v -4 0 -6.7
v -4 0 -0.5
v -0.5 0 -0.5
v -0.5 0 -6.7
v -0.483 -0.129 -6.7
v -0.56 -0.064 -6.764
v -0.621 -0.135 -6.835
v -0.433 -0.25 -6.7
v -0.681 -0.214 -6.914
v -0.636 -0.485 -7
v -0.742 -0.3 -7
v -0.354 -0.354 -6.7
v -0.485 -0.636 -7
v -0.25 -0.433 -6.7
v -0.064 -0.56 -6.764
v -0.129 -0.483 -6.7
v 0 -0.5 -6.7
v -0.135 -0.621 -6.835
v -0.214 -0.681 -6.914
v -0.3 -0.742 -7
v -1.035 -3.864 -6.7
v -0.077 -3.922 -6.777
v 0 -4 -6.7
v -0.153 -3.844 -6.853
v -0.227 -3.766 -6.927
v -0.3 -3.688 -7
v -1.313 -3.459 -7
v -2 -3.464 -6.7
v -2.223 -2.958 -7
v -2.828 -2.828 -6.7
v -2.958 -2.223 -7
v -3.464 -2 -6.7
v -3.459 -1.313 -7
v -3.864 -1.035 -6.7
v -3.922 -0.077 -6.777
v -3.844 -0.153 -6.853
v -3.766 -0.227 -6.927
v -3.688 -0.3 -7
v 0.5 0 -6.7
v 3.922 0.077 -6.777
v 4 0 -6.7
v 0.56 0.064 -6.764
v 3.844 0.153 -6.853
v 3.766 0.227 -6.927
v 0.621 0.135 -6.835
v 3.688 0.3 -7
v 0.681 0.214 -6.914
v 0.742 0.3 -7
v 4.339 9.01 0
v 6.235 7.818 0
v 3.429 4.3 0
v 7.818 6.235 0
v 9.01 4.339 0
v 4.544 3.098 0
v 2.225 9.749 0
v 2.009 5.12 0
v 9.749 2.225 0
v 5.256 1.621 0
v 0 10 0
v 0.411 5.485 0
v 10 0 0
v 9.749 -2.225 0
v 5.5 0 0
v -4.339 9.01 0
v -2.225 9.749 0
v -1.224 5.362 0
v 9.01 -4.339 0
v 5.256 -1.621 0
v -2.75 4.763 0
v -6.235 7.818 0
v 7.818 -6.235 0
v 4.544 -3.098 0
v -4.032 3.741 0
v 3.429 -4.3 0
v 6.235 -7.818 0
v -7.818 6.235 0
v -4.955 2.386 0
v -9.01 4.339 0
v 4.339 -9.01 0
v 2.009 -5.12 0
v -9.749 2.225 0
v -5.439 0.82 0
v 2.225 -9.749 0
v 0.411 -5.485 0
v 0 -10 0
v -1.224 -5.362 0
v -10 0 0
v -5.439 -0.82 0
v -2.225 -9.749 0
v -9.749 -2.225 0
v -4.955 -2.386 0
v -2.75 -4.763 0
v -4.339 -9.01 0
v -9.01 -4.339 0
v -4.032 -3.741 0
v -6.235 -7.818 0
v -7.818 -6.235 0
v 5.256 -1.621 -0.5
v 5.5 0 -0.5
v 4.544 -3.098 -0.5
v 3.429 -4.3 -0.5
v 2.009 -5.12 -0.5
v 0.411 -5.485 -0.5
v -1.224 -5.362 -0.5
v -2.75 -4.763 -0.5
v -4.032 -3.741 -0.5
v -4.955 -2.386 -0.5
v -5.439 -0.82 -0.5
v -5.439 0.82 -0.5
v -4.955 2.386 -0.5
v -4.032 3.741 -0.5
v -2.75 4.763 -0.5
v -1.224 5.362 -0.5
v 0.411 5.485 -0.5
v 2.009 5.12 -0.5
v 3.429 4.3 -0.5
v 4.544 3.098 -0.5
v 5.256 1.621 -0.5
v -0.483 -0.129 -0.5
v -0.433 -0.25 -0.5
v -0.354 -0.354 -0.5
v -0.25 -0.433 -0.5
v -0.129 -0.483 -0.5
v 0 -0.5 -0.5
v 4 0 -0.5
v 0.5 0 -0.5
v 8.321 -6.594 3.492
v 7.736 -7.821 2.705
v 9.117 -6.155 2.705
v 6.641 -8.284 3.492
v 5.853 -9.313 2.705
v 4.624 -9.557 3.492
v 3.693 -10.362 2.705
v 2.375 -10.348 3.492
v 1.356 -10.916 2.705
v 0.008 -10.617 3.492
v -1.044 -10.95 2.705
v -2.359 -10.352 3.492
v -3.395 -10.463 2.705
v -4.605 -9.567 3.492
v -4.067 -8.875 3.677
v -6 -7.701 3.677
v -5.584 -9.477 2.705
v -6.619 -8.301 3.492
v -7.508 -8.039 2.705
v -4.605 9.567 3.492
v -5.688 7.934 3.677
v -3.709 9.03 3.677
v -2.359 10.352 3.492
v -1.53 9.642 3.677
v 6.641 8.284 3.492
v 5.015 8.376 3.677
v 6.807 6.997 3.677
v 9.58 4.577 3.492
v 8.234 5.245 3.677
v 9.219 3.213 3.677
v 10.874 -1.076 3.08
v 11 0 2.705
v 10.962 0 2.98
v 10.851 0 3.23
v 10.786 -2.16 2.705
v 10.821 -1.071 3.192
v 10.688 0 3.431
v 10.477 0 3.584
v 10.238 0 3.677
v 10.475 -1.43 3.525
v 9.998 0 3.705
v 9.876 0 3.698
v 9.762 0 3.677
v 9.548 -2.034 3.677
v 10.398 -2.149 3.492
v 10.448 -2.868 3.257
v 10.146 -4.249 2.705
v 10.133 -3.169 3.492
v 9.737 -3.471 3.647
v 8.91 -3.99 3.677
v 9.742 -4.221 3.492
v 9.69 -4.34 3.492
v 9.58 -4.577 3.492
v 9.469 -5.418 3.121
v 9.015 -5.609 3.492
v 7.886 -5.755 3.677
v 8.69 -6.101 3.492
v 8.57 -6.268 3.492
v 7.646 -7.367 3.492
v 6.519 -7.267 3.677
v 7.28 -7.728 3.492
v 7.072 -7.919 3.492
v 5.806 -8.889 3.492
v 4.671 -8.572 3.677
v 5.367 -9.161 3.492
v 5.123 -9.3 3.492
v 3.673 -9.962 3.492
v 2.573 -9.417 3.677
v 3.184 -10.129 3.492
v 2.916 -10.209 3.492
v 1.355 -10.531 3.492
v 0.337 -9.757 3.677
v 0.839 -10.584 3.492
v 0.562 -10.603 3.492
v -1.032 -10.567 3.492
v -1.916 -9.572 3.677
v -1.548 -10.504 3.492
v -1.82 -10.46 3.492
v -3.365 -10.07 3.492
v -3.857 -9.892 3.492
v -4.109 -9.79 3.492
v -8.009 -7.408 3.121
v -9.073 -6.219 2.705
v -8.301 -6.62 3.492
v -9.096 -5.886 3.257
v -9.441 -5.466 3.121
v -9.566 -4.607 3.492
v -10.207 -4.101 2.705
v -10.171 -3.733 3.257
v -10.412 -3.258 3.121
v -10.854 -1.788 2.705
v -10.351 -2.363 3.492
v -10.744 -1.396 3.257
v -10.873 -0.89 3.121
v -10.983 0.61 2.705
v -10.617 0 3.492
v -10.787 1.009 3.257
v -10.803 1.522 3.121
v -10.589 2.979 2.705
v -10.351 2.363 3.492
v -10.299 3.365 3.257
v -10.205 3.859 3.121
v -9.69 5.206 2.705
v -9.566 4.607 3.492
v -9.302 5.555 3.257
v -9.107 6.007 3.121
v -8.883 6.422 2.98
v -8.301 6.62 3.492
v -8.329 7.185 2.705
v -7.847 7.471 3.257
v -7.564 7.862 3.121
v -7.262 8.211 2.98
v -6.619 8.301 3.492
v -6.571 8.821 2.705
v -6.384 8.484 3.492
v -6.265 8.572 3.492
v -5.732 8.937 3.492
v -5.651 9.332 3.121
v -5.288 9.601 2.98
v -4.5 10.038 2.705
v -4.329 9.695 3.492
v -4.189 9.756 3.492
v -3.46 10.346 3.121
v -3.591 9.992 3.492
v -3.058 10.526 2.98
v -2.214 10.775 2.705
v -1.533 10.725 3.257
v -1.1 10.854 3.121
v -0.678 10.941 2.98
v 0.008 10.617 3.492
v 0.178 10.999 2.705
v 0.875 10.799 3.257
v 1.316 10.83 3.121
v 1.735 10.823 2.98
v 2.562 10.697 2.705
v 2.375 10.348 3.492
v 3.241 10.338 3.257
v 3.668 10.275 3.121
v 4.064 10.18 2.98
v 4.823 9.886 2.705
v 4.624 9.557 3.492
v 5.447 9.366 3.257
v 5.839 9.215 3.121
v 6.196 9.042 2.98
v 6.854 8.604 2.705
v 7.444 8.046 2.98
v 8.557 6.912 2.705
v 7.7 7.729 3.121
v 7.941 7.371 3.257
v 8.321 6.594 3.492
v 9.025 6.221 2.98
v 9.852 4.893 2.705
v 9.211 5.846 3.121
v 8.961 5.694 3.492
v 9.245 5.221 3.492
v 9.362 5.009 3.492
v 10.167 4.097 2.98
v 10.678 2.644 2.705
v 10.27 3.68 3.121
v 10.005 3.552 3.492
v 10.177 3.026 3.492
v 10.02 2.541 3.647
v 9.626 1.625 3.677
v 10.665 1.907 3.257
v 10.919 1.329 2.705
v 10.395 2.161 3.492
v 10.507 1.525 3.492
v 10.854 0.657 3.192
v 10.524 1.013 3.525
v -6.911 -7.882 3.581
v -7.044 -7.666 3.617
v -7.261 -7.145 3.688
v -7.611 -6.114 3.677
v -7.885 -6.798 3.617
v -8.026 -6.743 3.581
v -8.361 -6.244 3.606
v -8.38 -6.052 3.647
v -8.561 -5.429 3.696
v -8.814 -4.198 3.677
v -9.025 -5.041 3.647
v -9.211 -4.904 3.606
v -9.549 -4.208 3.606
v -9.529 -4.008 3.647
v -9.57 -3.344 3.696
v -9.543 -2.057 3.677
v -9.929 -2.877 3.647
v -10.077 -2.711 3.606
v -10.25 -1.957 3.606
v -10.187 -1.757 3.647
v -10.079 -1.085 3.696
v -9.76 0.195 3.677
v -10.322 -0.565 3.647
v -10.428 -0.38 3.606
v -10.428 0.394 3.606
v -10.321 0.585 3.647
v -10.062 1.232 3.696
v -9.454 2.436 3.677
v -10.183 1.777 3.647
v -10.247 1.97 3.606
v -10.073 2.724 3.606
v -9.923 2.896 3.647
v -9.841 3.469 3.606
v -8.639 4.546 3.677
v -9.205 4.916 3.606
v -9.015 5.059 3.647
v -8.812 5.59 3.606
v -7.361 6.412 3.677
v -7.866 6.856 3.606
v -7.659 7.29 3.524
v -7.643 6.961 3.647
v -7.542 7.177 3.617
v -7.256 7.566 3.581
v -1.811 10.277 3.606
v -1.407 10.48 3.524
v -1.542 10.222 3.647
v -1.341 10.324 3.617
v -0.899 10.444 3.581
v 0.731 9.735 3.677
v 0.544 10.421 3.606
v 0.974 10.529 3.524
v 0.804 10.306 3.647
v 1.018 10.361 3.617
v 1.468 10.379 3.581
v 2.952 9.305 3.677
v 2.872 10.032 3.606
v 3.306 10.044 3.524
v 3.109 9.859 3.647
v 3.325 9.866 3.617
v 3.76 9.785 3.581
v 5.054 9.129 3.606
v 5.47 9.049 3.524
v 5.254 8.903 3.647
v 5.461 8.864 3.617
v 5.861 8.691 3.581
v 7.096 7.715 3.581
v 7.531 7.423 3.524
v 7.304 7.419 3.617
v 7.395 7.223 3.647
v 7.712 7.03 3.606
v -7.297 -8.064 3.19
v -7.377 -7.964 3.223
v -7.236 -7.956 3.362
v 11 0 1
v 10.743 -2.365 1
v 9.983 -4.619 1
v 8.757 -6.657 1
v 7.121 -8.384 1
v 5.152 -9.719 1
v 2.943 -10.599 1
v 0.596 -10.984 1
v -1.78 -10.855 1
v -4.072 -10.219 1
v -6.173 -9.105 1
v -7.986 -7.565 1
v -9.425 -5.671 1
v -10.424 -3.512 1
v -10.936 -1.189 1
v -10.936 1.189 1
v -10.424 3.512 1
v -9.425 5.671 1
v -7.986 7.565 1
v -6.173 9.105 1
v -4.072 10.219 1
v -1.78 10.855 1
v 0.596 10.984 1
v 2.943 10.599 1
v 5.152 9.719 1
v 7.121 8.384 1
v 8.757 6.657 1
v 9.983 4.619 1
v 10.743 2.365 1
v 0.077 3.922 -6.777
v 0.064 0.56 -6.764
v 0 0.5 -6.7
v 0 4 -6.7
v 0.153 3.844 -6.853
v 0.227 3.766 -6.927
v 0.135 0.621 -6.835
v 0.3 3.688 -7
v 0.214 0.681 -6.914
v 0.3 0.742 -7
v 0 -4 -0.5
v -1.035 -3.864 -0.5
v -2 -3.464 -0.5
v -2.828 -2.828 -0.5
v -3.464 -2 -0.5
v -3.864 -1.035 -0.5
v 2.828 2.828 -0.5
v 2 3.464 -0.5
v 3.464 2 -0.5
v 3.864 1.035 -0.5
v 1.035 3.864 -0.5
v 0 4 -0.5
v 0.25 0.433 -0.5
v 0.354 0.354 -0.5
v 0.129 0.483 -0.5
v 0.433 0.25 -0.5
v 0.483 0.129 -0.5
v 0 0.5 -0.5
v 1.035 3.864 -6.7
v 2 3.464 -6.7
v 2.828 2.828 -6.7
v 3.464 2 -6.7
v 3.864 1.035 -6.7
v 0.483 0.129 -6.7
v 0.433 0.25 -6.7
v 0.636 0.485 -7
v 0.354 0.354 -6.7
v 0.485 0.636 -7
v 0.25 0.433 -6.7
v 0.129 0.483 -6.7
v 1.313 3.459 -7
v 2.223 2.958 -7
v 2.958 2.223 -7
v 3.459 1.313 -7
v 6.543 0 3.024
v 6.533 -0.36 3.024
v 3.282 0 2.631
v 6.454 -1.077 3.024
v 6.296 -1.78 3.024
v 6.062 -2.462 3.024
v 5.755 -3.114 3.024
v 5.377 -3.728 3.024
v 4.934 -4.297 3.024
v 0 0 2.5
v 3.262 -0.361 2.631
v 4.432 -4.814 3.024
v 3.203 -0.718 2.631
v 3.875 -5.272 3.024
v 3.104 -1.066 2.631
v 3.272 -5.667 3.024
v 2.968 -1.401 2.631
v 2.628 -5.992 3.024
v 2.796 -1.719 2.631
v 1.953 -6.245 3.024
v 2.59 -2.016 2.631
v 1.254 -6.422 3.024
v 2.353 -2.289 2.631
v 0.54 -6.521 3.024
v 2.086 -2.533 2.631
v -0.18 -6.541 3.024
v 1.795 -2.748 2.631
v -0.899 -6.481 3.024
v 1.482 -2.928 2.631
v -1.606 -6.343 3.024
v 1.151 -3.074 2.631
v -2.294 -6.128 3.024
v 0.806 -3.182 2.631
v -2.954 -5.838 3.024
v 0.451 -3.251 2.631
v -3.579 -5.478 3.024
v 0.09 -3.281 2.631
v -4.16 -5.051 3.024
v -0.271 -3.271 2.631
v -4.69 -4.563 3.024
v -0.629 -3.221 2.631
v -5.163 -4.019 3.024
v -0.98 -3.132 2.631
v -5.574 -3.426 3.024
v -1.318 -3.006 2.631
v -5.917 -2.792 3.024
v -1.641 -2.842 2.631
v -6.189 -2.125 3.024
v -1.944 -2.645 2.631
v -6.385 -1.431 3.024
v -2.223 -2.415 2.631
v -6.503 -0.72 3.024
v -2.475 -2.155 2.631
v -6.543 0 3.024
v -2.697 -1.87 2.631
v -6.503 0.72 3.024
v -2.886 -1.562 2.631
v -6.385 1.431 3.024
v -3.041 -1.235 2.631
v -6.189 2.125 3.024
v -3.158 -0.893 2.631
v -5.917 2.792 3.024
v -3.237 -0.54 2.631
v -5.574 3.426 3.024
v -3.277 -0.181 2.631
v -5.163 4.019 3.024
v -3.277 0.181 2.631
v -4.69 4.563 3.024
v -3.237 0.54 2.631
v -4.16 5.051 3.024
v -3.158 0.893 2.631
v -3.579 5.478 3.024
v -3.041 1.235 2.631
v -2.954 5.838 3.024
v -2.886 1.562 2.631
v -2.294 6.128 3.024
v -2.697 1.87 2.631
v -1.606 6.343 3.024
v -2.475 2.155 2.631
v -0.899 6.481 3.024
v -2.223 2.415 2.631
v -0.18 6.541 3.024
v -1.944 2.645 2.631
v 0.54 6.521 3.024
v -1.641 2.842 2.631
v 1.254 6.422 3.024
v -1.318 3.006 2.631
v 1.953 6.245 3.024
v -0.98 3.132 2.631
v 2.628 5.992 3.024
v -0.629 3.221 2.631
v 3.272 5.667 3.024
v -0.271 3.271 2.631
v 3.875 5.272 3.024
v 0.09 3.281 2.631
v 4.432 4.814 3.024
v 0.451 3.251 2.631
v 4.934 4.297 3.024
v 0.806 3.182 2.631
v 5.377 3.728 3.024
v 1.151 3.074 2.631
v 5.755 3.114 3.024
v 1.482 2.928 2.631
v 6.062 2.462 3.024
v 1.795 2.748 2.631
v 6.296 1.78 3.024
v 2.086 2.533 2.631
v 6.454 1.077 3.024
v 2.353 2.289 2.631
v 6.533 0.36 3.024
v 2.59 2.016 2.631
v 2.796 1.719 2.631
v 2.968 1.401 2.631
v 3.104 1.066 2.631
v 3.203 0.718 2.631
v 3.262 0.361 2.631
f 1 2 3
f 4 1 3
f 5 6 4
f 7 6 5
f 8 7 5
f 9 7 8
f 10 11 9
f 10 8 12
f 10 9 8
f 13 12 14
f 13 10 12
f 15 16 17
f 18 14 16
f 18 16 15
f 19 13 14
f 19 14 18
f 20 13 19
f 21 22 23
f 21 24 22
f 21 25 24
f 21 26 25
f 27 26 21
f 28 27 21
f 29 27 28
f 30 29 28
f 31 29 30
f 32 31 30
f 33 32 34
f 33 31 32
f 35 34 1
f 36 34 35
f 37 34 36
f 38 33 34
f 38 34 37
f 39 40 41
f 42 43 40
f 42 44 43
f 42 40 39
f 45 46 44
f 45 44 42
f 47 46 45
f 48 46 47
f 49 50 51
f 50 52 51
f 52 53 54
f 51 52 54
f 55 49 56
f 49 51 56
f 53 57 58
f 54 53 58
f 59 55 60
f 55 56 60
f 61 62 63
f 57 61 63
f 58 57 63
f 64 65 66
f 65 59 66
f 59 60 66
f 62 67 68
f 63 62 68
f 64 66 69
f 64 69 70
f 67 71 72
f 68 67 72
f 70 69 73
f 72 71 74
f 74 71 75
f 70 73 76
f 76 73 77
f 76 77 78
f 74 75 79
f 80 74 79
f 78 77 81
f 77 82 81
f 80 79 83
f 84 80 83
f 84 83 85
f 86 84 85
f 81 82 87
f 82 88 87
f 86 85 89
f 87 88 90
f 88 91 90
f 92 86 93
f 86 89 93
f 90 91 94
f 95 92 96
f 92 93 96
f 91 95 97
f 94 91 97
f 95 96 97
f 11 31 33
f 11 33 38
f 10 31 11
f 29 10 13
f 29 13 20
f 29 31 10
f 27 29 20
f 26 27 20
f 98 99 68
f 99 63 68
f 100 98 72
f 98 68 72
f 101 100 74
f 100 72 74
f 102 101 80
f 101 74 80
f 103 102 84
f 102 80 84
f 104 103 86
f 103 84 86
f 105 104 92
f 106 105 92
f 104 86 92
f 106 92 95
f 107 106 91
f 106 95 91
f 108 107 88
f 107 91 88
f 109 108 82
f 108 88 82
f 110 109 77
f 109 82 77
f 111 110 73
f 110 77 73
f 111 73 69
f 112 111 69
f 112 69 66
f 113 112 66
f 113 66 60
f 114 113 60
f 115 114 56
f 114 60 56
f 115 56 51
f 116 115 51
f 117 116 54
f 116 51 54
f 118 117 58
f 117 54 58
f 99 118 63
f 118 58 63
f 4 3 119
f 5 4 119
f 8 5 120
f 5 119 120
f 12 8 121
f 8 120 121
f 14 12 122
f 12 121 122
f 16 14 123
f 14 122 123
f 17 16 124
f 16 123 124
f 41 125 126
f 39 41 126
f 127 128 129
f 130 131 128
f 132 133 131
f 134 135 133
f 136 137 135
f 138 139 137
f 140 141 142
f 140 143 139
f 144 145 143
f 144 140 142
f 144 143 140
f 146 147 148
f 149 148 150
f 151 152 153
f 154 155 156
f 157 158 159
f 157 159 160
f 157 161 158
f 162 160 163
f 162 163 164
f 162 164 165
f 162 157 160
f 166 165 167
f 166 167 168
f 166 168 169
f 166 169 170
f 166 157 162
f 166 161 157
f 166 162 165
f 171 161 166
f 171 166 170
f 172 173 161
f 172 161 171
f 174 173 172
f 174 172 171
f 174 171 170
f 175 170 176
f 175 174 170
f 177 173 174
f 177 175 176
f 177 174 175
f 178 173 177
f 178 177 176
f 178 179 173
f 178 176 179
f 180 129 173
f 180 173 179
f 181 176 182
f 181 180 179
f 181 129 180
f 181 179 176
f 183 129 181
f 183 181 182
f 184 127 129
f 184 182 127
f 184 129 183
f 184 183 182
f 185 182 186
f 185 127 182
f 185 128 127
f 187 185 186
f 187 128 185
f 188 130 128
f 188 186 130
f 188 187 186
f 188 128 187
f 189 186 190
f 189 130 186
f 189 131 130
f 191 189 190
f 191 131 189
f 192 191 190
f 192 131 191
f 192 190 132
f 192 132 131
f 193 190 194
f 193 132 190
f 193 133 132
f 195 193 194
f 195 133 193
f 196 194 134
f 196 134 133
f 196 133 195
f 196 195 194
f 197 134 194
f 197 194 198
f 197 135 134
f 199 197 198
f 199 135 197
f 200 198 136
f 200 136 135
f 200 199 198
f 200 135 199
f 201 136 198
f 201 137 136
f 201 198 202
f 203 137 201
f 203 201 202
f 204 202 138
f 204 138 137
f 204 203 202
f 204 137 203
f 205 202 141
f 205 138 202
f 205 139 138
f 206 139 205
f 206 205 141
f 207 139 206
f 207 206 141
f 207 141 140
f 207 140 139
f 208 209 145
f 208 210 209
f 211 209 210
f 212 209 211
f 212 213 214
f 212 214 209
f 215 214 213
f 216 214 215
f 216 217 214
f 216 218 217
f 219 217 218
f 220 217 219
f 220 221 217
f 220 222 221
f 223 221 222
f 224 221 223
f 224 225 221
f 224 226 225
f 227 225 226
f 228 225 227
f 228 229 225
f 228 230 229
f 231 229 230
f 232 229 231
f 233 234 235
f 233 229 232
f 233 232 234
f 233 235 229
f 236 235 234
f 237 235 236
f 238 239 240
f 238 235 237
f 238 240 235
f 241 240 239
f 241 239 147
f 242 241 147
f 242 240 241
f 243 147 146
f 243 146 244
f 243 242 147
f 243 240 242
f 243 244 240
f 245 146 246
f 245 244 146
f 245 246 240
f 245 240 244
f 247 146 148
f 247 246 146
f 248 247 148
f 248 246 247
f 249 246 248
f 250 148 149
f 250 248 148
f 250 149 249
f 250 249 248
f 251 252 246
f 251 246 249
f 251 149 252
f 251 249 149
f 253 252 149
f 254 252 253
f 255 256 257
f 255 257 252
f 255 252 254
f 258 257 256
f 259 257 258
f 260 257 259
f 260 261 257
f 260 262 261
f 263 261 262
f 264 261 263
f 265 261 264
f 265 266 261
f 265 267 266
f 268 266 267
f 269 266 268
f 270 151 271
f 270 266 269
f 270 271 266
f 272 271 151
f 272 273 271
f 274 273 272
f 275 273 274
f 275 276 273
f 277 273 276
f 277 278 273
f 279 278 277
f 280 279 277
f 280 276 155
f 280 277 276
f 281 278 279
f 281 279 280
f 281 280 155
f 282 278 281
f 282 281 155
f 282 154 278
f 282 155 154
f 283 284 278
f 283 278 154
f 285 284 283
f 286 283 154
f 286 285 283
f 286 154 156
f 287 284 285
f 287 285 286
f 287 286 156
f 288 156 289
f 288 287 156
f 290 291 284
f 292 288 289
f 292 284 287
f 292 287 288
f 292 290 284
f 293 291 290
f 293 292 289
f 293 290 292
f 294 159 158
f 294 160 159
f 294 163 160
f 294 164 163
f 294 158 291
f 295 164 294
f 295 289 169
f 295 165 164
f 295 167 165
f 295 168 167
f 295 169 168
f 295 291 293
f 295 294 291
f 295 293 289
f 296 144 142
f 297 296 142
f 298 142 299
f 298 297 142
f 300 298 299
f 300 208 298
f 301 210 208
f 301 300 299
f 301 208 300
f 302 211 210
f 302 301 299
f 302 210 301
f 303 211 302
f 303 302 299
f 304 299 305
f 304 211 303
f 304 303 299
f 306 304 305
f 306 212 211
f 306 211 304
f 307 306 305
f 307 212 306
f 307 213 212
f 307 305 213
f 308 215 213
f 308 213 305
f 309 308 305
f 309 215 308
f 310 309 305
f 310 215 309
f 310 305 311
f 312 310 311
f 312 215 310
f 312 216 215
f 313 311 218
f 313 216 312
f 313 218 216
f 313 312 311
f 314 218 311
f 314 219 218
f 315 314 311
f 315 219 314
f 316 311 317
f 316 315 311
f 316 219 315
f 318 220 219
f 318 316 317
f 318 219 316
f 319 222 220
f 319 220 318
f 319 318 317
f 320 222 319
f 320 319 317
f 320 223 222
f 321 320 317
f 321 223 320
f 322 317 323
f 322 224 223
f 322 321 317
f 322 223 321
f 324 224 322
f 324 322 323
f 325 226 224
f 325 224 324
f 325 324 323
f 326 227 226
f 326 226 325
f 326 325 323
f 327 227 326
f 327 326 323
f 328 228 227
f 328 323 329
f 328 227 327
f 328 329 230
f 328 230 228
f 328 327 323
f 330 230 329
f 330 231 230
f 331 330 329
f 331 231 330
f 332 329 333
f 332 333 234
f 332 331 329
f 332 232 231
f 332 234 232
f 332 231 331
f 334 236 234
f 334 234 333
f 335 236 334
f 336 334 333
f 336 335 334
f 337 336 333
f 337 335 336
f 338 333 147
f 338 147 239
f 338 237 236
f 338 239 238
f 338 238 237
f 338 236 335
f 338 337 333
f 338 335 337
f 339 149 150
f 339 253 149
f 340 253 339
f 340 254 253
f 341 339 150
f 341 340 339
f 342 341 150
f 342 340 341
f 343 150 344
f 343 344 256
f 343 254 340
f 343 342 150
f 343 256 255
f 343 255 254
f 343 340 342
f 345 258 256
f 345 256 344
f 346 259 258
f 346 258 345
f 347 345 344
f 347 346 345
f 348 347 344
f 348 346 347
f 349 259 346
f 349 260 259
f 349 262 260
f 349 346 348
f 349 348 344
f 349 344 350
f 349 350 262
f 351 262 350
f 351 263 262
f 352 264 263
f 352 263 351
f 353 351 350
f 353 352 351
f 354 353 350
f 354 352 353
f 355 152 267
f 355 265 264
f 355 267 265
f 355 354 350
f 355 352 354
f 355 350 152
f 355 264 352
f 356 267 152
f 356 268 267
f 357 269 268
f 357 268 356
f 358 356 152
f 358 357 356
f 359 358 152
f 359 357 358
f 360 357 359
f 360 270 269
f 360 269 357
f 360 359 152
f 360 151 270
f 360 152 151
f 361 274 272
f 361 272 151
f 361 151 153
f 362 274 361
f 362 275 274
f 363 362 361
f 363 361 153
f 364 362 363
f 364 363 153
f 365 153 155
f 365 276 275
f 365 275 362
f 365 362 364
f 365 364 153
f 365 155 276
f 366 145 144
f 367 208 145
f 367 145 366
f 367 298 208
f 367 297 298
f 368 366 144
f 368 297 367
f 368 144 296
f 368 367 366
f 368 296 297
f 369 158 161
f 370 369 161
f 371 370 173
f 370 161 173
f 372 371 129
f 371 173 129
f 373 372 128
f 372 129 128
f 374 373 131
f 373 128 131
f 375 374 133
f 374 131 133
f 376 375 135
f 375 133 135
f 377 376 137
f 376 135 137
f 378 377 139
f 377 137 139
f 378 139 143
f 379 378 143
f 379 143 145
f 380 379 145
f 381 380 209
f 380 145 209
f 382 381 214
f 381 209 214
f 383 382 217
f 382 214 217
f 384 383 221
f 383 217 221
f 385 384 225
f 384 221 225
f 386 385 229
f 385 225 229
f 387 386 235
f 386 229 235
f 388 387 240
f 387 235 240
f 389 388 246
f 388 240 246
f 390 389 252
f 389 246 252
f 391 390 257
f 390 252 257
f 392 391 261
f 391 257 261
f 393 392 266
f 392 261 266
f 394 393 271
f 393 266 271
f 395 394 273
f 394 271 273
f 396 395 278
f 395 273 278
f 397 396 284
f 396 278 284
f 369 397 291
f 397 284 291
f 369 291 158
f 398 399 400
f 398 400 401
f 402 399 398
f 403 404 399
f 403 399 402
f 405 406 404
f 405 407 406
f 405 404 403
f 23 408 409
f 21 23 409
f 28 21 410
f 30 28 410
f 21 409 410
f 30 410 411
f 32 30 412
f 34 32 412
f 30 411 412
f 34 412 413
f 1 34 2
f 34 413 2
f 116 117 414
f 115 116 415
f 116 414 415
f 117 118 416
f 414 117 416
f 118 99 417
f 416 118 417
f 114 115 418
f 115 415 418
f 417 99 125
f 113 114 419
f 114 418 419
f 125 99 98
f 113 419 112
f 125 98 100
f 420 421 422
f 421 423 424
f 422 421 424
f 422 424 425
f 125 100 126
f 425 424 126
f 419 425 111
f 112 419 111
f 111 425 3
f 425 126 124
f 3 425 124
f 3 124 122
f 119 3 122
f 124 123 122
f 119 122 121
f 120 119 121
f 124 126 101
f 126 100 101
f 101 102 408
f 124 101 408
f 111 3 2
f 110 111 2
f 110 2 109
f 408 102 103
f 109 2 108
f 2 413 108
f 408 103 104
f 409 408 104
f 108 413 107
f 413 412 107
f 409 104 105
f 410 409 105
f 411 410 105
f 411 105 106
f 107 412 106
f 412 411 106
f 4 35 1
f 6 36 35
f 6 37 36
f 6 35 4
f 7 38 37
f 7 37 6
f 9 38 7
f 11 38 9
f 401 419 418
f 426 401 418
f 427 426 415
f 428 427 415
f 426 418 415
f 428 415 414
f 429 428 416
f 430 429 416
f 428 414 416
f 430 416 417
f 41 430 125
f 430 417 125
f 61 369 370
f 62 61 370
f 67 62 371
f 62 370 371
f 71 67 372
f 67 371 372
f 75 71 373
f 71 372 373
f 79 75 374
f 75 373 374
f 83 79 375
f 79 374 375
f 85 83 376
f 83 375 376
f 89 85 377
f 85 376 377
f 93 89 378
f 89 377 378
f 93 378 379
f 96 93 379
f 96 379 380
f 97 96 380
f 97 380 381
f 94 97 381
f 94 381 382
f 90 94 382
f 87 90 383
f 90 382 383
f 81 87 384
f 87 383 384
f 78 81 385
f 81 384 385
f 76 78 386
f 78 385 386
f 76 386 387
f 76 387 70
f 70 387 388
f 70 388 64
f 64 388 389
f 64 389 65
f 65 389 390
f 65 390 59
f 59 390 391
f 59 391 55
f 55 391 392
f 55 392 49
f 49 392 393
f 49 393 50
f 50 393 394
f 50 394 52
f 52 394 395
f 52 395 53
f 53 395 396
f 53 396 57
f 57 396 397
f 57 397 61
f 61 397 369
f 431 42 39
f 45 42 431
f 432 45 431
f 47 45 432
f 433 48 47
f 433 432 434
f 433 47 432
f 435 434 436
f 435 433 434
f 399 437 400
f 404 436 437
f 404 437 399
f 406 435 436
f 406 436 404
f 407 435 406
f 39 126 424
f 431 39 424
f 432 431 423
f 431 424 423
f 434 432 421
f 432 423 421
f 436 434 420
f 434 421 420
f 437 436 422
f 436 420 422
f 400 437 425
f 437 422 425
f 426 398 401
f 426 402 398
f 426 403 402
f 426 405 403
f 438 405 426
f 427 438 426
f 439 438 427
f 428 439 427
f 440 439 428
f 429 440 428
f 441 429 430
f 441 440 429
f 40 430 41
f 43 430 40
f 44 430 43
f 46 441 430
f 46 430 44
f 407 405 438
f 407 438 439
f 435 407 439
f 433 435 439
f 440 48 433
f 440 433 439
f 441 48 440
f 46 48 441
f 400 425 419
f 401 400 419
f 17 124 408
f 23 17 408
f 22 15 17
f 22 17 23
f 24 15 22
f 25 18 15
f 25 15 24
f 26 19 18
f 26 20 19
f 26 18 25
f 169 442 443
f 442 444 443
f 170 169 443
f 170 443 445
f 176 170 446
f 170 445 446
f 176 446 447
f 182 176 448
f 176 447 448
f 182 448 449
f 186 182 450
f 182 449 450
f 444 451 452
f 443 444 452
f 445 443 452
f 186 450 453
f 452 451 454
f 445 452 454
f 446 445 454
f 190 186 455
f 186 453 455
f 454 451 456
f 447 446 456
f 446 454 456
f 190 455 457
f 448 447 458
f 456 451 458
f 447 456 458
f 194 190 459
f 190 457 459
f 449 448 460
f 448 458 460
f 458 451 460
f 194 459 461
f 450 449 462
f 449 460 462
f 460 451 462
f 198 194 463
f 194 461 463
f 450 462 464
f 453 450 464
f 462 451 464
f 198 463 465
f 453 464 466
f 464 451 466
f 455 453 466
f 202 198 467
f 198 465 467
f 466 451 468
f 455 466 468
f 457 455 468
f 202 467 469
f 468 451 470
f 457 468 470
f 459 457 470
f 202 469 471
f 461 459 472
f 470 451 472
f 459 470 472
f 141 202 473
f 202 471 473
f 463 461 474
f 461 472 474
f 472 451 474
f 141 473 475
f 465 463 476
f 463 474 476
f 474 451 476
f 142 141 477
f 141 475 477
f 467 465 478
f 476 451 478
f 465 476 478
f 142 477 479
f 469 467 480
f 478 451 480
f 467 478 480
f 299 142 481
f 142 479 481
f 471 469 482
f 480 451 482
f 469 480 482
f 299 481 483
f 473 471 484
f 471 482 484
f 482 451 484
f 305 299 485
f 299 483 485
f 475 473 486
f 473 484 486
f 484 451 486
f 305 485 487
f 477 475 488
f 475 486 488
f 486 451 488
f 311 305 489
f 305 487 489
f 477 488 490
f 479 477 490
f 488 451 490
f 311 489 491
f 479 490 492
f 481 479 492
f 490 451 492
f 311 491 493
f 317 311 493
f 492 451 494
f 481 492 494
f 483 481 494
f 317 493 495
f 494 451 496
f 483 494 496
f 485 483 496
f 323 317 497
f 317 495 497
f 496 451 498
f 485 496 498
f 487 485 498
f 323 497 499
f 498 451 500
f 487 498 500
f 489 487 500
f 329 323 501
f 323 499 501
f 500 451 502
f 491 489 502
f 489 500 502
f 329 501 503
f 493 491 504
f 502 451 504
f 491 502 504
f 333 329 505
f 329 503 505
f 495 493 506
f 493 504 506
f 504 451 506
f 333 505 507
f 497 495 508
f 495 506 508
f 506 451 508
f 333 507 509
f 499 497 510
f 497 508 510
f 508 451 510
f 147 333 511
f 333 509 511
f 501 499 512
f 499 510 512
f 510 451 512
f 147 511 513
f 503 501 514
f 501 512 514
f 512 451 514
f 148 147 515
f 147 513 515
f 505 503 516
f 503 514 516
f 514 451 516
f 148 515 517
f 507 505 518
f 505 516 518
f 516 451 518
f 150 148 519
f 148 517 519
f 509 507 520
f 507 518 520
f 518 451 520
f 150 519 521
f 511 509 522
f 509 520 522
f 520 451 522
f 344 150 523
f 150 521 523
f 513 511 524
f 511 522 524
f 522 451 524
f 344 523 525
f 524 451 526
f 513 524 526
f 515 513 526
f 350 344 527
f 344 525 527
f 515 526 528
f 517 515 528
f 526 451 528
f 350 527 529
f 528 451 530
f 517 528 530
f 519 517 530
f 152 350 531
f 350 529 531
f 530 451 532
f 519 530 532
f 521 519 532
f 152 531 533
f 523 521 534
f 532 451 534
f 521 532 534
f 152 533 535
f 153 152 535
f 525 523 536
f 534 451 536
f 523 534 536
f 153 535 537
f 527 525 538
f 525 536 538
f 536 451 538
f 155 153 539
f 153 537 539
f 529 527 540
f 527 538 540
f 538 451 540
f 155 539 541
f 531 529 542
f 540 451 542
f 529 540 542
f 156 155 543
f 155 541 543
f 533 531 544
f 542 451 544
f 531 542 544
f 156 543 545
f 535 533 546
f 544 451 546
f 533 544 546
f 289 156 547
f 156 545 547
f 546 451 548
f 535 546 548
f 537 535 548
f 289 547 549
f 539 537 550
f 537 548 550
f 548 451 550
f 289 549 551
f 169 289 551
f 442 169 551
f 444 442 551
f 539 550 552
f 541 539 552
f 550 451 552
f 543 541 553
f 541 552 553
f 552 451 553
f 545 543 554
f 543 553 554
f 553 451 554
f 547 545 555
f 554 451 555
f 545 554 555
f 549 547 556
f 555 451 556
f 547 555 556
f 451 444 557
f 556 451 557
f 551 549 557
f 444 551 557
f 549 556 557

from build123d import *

# Parameters (mm, degrees)
F0_W     = 5.5
F0_H     = 0.5
F2_SIZE  = 1
F3_R     = 1
F5_DEPTH = 6.5
F6_SIZE  = 0.3


with BuildPart() as f1:
    # F0 (on Front) → F1 (revolve)
    with BuildSketch(Plane.XZ):
        with BuildLine():
            ThreePointArc((11, 4), (5.5509008278, 2.8767272628), (0, 2.5))
            Line((0, 2.5), (0, 0))
            Line((0, 0), (5.5, 0))
            Line((5.5, 0), (11, 0))
            Line((11, 0), (11, 4))
        make_face()
        with Locations((2.75, -0.25)):
            Rectangle(F0_W, F0_H)
    revolve(axis=Axis((0, 0, 1.25), (0, 0, -1)))

    # F2
    f2_edges = [f1.edges().sort_by_distance(p)[0] for p in [
        (-11, 0, 0),
    ]]
    chamfer(f2_edges, length=F2_SIZE)

    # F3
    f3_edges = [f1.edges().sort_by_distance(p)[0] for p in [
        (-11, 0, 4),
    ]]
    fillet(f3_edges, radius=F3_R)

    # F4 (on face) → F5 (join)
    with BuildSketch(Plane(origin=(0, 0, -0.5), x_dir=(1, 0, 0), z_dir=(0, 0, -1))):
        with BuildLine():
            ThreePointArc((-0.5, 0), (-0.3535533906, 0.3535533906), (0, 0.5))
            Line((0, 0.5), (0, 4))
            ThreePointArc((0, 4), (-2.8284271247, 2.8284271247), (-4, 0))
            Line((-4, 0), (-0.5, 0))
        make_face()
        with BuildLine():
            Line((4, 0), (0.5, 0))
            ThreePointArc((0.5, 0), (0.3535533906, -0.3535533906), (0, -0.5))
            Line((0, -0.5), (0, -4))
            ThreePointArc((0, -4), (2.8284271247, -2.8284271247), (4, 0))
        make_face()
    extrude(amount=F5_DEPTH)

    # F6
    f6_edges = [f1.edges().sort_by_distance(p)[0] for p in [
        (0, -2.25, -7),
        (-2.828427, -2.828427, -7),
        (-2.25, 0, -7),
        (-0.353553, -0.353553, -7),
        (0.353553, 0.353553, -7),
        (2.25, 0, -7),
        (2.828427, 2.828427, -7),
        (0, 2.25, -7),
    ]]
    chamfer(f6_edges, length=F6_SIZE)


solid = f1.part
